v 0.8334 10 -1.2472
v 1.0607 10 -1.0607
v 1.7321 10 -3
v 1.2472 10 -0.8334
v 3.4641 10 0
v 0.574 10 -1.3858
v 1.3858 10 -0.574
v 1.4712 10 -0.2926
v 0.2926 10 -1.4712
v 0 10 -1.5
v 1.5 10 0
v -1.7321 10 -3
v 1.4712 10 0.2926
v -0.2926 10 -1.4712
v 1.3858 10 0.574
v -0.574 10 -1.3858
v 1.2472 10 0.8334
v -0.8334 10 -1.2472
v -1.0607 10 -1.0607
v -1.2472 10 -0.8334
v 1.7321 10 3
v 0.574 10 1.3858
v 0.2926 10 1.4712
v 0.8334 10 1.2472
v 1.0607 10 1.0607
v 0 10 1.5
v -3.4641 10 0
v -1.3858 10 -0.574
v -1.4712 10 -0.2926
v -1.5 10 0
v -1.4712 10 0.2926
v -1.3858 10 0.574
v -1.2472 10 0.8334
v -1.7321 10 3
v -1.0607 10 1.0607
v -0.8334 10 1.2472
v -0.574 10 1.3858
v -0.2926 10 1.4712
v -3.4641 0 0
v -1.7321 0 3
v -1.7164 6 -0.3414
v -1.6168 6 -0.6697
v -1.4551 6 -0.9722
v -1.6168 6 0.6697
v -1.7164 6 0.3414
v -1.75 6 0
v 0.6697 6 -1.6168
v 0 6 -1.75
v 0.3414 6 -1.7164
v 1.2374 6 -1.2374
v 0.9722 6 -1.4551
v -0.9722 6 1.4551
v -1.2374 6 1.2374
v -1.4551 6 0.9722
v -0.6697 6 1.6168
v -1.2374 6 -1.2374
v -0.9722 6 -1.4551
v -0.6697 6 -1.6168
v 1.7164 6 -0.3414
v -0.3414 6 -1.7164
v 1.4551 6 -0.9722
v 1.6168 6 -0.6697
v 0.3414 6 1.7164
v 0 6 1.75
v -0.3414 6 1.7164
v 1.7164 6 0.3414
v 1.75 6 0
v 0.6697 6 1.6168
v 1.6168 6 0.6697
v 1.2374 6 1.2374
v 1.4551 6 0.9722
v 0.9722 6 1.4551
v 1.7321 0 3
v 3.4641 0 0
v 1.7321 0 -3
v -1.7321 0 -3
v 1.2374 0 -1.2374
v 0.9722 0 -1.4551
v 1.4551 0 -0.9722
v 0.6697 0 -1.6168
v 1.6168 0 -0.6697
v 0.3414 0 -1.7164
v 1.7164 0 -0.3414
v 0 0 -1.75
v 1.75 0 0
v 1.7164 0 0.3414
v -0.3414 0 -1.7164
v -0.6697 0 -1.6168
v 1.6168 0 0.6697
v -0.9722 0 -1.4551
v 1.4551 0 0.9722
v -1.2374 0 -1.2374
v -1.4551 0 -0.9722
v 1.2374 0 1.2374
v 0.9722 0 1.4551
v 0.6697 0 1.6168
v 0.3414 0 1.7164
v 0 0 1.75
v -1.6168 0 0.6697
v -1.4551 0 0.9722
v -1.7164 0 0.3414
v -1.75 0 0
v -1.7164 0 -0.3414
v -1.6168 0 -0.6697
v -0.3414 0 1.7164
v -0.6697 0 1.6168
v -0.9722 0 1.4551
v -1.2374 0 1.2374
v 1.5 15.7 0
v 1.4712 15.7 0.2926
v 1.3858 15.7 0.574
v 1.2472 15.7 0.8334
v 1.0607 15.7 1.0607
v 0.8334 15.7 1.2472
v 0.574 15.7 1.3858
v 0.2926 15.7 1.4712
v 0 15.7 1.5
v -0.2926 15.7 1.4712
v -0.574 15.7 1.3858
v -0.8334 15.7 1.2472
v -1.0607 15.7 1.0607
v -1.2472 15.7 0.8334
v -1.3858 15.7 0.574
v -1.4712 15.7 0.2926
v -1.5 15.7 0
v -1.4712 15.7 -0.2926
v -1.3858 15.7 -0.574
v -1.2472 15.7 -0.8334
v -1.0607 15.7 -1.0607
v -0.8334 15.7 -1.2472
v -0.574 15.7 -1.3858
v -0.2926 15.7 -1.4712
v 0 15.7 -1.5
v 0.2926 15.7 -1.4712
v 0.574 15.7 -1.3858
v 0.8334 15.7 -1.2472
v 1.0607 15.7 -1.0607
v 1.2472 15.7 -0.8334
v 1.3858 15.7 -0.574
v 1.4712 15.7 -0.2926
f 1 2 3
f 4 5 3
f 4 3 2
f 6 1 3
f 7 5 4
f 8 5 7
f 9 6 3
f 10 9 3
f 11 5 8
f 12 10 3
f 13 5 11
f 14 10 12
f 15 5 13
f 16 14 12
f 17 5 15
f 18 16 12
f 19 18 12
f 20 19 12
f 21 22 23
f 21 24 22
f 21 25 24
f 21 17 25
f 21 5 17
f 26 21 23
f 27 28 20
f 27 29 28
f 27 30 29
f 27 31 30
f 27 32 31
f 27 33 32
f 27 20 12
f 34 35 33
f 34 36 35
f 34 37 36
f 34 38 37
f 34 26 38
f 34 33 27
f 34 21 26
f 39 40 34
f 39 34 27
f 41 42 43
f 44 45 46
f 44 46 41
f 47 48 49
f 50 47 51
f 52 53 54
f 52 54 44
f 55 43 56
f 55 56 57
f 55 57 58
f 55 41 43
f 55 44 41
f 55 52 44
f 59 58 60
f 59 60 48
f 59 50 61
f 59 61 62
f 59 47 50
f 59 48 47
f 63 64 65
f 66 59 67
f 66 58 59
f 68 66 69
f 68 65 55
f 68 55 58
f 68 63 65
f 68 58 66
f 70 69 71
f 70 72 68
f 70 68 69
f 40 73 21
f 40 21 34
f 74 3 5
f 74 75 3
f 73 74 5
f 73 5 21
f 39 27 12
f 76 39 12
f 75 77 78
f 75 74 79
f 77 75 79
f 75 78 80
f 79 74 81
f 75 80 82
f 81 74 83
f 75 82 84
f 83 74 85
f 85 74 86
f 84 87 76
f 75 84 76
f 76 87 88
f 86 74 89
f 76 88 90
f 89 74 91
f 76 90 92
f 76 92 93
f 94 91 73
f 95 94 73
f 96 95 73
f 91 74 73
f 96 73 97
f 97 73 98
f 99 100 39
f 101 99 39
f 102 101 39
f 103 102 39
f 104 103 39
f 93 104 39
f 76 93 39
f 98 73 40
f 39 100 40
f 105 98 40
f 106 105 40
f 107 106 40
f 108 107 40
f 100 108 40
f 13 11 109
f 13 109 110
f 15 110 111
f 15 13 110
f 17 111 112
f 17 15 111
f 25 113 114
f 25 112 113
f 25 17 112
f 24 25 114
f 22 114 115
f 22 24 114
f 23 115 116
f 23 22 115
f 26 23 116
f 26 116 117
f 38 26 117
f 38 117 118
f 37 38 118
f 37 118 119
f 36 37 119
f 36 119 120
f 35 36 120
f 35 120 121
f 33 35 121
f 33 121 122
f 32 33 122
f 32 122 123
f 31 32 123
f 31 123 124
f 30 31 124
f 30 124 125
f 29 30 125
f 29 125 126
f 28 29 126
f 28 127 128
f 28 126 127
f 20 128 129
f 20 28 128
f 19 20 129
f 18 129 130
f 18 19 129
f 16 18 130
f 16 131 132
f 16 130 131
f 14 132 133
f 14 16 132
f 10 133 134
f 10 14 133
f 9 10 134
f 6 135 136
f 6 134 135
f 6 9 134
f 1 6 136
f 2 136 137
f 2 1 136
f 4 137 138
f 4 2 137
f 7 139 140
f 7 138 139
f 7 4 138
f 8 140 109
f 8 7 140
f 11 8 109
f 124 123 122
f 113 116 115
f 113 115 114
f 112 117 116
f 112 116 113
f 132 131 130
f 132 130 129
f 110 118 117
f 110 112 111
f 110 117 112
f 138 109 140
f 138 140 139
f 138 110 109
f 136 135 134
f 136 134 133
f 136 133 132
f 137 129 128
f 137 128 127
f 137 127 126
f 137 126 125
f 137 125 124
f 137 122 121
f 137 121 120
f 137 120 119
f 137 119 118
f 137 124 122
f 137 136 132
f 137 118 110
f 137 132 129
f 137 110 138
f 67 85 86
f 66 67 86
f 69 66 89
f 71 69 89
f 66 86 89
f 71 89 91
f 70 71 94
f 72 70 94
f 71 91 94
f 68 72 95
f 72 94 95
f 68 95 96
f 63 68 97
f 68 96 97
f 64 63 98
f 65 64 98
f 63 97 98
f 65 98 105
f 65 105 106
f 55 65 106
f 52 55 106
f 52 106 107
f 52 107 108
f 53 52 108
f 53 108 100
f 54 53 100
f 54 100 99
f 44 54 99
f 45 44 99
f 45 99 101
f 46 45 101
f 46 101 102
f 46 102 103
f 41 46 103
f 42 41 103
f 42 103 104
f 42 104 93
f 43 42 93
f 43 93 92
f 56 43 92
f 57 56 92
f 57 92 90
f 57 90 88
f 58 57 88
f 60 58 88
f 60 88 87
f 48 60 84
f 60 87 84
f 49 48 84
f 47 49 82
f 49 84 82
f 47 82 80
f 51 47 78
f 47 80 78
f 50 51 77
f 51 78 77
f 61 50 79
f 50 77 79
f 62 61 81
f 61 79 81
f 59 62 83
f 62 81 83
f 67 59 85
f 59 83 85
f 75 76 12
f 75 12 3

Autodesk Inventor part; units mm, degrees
ref_plane "YZ Plane" through (0, 0, 0) normal (1, 0, 0) x (0, 1, 0)
ref_plane "XZ Plane" through (0, 0, 0) normal (0, 1, 0) x (-1, 0, 0)
ref_plane "XY Plane" through (0, 0, 0) normal (0, 0, 1) x (1, 0, 0)
sketch "Sketch1" plane through (0, 0, 0) normal (0, 1, 0) x (-1, 0, 0)
  line L0 (-3.4641, 0) -> (-1.7321, 3)
  line L1 (-1.7321, 3) -> (1.7321, 3)
  line L2 (1.7321, 3) -> (3.4641, 0)
  line L3 (3.4641, 0) -> (1.7321, -3)
  line L4 (1.7321, -3) -> (-1.7321, -3)
  line L5 (-1.7321, -3) -> (-3.4641, 0)
  point P0 (0, 0)
  point P1 (0, 0)
  dimension "d1" = 6
extrude "Extrusion1" add sketch "Sketch1" along normal blind 10
sketch "Sketch2" plane through (0, 0, 0) normal (0, -1, 0) x (1, 0, 0)
  circle A0 centre (0, 0) radius 1.75
  dimension "d4" = 3.5
sketch "Sketch3" plane through (0, 10, 0) normal (0, 1, 0) x (1, 0, 0)
  circle A0 centre (0, 0) radius 1.5
  dimension "d5" = 3
extrude "Extrusion2" add sketch "Sketch3" along normal blind 5.7
extrude "Extrusion3" cut sketch "Sketch2" against normal blind 6
thread "Thread1" size "M3x0.35" class "6g" standard "ANSI Metric M Profile" full length
thread "Thread2" size "M4x0.5" class "6H" standard "ANSI Metric M Profile" full length
properties part number "spacer1cm"
